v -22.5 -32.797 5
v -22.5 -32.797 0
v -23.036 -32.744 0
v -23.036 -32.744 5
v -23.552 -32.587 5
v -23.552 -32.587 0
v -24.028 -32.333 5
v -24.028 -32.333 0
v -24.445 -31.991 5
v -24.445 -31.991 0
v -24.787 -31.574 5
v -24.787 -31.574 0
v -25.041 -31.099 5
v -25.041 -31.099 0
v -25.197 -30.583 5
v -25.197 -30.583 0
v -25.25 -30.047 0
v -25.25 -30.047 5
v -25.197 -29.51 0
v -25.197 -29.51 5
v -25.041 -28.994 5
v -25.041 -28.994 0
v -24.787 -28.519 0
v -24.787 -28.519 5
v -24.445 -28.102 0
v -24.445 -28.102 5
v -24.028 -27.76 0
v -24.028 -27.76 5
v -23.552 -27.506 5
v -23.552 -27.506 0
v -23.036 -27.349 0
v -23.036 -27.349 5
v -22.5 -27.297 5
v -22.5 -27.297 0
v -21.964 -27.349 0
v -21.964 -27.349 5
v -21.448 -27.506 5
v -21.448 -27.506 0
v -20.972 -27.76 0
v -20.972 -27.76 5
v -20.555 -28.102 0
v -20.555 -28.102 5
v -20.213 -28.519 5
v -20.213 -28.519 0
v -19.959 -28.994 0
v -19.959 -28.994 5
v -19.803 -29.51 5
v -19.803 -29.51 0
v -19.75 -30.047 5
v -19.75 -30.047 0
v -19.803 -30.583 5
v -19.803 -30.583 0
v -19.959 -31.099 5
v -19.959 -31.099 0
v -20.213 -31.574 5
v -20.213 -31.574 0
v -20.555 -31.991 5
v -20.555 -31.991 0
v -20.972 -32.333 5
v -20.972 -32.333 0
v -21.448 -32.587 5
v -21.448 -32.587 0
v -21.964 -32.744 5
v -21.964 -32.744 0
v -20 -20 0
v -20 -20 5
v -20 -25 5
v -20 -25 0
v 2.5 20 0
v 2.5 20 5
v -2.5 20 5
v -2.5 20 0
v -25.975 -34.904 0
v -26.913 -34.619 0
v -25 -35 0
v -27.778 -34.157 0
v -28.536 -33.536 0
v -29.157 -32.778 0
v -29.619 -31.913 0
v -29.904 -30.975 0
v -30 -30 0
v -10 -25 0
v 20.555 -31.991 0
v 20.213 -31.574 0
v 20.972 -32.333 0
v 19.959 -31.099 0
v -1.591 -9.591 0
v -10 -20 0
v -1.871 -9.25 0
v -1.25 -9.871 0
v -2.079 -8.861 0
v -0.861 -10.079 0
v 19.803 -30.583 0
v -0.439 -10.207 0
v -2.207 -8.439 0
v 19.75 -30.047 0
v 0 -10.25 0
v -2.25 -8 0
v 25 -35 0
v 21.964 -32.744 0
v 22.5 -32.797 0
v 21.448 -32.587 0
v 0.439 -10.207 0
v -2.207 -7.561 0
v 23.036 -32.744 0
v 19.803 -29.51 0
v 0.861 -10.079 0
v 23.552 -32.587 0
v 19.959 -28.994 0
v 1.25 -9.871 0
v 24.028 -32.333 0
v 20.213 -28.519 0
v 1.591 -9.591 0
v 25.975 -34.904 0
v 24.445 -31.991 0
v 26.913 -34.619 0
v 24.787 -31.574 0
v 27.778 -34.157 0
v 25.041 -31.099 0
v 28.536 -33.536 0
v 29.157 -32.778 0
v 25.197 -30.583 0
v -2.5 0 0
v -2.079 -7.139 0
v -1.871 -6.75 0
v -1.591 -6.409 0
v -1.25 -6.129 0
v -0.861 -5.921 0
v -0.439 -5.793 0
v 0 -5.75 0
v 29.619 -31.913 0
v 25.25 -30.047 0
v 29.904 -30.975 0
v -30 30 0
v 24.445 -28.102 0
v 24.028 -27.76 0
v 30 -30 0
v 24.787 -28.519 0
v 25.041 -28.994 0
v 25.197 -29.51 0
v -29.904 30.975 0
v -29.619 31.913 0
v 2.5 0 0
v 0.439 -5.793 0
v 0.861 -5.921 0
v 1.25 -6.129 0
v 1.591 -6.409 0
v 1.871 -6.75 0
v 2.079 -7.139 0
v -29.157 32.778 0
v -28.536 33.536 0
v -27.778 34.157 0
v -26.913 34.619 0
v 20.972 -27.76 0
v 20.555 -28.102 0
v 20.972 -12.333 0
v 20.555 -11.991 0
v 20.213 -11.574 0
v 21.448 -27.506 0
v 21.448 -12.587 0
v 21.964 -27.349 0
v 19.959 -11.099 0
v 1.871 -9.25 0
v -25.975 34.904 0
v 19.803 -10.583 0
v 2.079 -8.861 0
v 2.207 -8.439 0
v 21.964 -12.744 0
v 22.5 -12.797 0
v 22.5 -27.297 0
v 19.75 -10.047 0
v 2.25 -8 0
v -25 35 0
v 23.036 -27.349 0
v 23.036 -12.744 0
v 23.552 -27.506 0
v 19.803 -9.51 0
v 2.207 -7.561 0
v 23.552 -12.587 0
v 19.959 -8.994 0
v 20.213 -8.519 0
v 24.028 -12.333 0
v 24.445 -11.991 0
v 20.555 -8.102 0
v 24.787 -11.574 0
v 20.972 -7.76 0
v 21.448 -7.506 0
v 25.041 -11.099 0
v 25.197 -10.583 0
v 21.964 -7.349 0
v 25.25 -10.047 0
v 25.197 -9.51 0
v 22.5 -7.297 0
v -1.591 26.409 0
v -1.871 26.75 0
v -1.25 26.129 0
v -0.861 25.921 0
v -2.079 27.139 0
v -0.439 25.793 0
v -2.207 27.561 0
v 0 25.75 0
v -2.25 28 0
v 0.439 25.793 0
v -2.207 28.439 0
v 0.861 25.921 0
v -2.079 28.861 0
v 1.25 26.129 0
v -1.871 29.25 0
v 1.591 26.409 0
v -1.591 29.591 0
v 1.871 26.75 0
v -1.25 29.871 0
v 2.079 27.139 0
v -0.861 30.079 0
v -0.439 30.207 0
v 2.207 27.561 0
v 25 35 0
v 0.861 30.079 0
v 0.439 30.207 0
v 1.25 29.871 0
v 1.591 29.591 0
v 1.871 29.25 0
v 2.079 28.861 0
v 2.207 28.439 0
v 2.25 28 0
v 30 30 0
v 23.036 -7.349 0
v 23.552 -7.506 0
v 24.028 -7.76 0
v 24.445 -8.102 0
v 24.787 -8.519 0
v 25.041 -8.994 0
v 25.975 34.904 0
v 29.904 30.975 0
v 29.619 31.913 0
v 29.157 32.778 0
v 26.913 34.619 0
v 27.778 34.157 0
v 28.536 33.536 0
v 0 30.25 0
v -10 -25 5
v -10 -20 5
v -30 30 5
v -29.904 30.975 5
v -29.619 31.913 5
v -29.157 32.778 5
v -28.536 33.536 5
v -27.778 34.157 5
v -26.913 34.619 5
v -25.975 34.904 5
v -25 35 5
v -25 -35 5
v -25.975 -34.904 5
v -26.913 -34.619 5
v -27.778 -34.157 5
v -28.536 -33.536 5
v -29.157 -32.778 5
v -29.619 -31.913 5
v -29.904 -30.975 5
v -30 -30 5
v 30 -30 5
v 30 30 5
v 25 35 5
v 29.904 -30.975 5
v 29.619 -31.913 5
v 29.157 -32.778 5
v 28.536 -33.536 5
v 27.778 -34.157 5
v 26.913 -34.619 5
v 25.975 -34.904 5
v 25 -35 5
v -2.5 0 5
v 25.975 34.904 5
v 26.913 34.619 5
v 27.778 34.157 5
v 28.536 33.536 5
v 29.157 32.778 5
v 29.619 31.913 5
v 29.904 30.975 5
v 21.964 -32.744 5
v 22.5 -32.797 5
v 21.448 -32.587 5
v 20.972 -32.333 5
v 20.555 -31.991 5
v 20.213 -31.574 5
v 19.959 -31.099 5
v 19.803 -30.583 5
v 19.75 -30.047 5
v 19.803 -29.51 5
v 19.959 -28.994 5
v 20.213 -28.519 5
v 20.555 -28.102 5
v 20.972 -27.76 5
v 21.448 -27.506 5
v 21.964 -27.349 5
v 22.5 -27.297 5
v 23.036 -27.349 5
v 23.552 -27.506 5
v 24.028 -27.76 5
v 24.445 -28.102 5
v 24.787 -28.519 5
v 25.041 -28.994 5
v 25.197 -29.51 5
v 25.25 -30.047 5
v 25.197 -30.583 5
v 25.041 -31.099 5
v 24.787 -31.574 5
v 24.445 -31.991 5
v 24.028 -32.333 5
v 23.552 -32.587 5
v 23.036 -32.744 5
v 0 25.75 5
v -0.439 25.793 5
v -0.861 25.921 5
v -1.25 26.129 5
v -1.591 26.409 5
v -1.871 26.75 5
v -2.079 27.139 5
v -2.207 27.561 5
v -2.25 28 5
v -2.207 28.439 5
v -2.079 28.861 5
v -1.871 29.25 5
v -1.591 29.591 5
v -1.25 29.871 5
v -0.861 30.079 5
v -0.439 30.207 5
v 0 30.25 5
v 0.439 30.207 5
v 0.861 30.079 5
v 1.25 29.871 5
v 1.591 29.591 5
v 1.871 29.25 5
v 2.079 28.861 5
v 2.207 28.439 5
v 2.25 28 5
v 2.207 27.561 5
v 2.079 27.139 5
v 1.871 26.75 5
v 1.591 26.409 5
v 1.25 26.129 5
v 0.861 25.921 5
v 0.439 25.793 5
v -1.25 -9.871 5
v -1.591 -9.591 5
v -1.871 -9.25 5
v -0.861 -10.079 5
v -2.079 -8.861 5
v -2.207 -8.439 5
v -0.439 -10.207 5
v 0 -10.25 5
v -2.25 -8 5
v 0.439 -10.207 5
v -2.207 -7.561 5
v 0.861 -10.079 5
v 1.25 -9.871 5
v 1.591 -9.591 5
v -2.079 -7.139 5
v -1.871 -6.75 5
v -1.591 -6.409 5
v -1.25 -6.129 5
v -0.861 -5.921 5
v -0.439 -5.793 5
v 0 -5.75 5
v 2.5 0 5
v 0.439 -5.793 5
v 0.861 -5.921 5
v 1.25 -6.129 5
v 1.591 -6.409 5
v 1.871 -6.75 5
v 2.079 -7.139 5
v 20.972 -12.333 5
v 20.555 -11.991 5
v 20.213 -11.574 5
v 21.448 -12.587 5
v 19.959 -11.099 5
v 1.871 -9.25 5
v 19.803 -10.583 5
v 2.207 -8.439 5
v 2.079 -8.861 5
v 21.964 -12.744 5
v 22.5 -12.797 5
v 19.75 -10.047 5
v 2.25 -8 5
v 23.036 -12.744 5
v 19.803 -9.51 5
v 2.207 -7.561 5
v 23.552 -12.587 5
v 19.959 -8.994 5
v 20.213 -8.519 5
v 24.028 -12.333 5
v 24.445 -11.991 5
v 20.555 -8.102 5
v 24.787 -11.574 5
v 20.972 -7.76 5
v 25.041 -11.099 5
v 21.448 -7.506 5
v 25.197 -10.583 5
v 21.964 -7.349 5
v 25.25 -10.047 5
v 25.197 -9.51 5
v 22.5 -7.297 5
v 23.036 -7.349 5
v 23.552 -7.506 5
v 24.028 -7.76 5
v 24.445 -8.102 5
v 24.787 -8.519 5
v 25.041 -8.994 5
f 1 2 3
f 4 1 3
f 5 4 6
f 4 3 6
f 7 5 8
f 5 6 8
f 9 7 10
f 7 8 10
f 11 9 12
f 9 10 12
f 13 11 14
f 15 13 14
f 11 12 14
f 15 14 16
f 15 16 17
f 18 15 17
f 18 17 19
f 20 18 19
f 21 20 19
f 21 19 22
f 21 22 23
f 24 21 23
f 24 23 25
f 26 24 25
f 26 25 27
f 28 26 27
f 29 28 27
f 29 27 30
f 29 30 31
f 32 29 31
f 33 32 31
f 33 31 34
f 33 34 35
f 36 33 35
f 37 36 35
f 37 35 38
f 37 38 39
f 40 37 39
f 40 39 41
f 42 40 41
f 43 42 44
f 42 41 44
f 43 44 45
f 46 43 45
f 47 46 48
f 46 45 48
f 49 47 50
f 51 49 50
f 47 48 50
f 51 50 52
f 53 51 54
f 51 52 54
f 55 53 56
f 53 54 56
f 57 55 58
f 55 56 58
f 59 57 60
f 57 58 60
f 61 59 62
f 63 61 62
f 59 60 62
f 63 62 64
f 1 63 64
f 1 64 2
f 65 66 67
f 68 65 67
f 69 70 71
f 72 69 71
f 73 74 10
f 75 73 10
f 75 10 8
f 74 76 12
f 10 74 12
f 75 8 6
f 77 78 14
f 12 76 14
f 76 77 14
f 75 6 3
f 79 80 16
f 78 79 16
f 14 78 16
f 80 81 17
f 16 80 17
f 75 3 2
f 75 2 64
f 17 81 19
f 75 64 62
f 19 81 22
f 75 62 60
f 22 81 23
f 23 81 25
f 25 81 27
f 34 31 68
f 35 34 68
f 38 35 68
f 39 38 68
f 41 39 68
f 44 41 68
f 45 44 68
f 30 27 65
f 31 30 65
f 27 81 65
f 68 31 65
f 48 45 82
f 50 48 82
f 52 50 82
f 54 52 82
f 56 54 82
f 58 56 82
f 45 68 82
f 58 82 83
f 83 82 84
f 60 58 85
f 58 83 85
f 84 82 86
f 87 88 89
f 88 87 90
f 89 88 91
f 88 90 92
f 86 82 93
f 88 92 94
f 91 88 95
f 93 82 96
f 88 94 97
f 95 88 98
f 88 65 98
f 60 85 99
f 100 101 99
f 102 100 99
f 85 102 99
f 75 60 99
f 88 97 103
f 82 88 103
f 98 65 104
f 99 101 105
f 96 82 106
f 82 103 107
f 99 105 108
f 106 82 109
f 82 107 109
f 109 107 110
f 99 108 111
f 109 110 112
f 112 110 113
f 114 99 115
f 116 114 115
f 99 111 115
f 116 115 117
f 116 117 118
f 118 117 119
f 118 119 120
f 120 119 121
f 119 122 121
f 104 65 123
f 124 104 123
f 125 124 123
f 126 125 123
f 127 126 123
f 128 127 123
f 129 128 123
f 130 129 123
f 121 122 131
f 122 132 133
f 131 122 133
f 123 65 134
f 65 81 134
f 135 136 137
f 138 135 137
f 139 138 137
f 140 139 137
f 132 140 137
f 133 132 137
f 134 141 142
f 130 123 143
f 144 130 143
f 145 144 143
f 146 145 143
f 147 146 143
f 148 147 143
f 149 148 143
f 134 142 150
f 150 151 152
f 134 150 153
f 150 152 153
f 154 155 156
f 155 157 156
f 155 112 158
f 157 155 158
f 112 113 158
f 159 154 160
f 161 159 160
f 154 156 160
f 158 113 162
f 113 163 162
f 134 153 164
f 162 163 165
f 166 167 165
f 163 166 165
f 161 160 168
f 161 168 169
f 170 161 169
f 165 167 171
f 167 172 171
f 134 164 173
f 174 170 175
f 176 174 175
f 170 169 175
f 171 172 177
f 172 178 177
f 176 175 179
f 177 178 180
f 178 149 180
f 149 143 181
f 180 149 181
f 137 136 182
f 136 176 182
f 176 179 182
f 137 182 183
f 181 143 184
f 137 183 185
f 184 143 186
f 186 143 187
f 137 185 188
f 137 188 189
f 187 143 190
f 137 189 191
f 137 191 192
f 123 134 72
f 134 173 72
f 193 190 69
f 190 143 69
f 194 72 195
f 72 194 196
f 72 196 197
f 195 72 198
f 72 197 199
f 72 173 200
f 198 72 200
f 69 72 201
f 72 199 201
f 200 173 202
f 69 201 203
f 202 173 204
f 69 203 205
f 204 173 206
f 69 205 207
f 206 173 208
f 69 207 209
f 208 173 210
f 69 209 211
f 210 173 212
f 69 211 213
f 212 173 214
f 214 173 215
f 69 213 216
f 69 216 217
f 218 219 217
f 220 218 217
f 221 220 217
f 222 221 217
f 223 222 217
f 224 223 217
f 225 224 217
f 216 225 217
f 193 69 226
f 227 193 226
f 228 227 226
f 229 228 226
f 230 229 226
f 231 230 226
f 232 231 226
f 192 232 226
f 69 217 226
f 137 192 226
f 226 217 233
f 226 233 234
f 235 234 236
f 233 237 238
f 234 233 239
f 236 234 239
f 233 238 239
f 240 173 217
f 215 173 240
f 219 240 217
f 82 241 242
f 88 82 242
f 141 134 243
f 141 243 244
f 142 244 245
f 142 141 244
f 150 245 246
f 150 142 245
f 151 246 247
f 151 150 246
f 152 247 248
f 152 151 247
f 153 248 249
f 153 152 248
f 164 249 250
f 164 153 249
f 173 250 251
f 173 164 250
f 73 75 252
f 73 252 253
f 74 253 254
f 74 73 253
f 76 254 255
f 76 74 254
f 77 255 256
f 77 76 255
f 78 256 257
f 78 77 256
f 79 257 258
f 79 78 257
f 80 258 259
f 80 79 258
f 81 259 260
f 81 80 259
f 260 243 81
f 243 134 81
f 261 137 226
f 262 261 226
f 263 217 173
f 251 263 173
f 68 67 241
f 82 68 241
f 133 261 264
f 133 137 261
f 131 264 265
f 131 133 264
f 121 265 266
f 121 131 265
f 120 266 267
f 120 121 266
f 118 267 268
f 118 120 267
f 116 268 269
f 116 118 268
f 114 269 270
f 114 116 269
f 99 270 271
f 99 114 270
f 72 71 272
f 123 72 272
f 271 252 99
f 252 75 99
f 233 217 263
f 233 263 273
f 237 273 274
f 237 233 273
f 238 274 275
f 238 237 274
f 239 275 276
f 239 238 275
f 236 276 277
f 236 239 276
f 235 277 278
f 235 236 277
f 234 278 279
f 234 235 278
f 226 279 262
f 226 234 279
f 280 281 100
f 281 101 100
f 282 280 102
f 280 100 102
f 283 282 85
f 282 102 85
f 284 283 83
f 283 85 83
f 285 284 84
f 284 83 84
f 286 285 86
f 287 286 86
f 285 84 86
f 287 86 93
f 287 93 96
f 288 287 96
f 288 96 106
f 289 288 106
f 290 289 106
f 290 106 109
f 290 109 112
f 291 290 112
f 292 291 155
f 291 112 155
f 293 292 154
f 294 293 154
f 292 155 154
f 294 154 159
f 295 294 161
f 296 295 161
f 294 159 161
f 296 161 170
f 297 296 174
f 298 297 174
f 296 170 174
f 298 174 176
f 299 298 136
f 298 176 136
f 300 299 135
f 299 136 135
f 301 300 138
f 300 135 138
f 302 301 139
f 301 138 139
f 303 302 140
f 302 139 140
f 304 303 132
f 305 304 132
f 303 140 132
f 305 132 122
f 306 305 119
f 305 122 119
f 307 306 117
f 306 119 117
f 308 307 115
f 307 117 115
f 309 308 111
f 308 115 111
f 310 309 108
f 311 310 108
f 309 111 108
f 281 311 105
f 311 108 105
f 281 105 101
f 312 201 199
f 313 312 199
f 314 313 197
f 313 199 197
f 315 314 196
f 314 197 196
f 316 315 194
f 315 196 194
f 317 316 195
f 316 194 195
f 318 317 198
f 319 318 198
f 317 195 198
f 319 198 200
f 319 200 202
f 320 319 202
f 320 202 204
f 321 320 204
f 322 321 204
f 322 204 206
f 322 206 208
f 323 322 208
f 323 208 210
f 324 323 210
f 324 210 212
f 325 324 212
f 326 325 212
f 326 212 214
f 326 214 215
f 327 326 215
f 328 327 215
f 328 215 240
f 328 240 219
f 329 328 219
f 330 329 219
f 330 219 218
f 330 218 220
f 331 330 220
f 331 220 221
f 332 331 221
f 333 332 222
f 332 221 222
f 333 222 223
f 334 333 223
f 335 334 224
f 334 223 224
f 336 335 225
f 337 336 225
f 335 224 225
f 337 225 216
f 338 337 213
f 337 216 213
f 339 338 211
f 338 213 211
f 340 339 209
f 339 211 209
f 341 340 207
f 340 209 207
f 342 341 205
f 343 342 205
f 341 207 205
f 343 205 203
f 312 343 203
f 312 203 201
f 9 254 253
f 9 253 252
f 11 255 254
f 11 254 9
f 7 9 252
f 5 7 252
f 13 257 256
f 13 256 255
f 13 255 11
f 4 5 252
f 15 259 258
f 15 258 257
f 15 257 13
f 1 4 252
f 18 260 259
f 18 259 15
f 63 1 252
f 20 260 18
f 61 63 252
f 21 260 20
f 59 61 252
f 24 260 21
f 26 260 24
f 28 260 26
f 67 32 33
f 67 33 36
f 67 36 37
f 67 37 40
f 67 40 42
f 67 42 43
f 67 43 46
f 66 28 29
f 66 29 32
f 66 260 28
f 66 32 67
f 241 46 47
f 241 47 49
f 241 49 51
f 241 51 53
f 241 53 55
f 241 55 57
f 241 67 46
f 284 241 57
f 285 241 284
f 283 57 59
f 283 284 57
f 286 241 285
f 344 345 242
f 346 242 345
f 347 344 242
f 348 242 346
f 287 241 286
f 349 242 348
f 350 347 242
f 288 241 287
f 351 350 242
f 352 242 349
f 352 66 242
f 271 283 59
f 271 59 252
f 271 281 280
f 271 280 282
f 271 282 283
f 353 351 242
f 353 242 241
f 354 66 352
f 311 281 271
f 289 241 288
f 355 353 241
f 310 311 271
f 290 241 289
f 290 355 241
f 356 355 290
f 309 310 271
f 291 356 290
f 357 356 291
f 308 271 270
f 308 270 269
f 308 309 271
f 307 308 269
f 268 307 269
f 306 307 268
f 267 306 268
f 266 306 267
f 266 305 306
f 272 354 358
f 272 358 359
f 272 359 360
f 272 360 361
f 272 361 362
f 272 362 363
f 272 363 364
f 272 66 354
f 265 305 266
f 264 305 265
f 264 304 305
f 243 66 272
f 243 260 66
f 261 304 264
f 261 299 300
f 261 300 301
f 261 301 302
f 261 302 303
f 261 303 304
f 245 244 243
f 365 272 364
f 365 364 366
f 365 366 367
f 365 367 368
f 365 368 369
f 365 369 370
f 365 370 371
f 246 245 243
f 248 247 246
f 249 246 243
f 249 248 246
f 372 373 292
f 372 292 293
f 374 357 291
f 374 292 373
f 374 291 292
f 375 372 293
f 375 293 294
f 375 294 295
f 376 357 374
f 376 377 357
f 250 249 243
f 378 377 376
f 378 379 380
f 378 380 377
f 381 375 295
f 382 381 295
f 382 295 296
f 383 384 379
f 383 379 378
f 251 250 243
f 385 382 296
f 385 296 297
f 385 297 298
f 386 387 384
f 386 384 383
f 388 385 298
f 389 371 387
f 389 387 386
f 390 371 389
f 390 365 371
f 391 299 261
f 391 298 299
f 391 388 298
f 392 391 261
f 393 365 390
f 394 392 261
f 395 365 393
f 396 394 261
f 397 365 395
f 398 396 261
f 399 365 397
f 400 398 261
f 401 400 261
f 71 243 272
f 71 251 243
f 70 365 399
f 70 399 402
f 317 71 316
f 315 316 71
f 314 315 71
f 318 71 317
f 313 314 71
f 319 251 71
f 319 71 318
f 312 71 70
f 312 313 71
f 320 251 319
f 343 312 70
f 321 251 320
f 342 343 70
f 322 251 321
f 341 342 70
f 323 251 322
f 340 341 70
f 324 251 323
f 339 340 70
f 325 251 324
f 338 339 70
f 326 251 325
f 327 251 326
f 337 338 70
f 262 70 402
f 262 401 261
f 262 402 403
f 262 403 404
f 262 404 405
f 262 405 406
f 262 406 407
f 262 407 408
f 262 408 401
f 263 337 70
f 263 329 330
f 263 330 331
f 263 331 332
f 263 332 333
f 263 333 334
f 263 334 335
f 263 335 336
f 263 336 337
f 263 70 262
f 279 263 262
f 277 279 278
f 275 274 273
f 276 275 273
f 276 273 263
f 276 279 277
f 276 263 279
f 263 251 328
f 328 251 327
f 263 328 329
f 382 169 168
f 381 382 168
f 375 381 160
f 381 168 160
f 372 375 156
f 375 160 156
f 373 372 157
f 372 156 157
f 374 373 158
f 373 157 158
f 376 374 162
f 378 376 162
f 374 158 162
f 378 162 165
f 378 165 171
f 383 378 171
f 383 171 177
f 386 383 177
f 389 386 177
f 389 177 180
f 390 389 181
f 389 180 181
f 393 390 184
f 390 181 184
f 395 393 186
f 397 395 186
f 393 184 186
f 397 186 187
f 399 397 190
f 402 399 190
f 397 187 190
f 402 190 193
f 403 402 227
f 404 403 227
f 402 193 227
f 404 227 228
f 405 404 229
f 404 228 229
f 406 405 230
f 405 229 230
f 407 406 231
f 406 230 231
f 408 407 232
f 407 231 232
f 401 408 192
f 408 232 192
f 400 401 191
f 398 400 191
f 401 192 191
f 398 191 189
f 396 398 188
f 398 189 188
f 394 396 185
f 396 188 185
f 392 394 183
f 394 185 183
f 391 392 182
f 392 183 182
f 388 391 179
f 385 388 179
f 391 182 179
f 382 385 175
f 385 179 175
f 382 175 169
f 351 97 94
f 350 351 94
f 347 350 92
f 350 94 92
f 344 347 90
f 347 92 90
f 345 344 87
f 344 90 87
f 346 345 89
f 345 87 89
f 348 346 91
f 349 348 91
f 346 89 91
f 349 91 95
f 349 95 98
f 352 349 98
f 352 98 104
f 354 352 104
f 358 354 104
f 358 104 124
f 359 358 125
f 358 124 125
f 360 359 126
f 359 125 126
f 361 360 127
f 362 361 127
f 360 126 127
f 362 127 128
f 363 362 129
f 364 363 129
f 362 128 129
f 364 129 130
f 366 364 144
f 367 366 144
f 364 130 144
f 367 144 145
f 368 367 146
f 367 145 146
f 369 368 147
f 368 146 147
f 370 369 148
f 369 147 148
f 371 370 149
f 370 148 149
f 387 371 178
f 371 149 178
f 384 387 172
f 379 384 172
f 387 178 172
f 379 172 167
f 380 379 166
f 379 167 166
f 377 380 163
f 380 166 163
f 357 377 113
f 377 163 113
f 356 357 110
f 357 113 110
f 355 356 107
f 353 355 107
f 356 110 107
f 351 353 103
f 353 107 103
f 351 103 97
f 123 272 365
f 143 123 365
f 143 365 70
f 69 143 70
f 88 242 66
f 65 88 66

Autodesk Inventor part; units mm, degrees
ref_plane "YZ Plane" through (0, 0, 0) normal (1, 0, 0) x (0, 1, 0)
ref_plane "XZ Plane" through (0, 0, 0) normal (0, 1, 0) x (-1, 0, 0)
ref_plane "XY Plane" through (0, 0, 0) normal (0, 0, 1) x (1, 0, 0)
sketch "Sketch1" plane through (0, 0, 0) normal (0, 0, 1) x (1, 0, 0)
  line L0 (-25, -35) -> (25, -35)
  line L1 (30, -30) -> (30, 30)
  line L2 (25, 35) -> (-25, 35)
  line L3 (-30, 30) -> (-30, -30)
  line L4 (-30, -35) -> (30, 35) construction
  line L5 (30, -35) -> (-30, 35) construction
  arc A0 (-25, 35) -> (-30, 30) centre (-25, 30) ccw
  arc A1 (30, 30) -> (25, 35) centre (25, 30) ccw
  arc A2 (25, -35) -> (30, -30) centre (25, -30) ccw
  arc A3 (-30, -30) -> (-25, -35) centre (-25, -30) ccw
  point P0 (0, 0)
  dimension "d0" = 60
  dimension "d1" = 70
  dimension "d4" = 5
extrude "Extrusion1" add sketch "Sketch1" along normal blind 5
sketch "Sketch2" plane through (0, 0, 5) normal (0, 0, 1) x (1, 0, 0)
  line L0 (-22.5, -30.0466) -> (22.5, -30.0466) construction
  line L1 (22.5, -30.0466) -> (22.5, -10.0466) construction
  line L2 (22.5, -10.0466) -> (-22.5, -10.0466) construction
  line L3 (-22.5, -10.0466) -> (-22.5, -30.0466) construction
  line L4 (-22.5, -30.0466) -> (22.5, -10.0466) construction
  line L5 (22.5, -30.0466) -> (-22.5, -10.0466) construction
  point P0 (0, 0)
  point P1 (0, -20.0466)
  point P2 (0, -20.0466)
  dimension "d5" = 45
  dimension "d6" = 20.0466
  dimension "d7" = 20
hole "Hole1" at (22.5, -10.0466, 5) at (22.5, -30.0466, 5) at (-22.5, -30.0466, 5) direction (0, 0, -1) diameter 5.5 depth 8 tip angle 118 clearance for "Countersunk Flat Head Screw DIN EN ISO 2009" size "M5" standard "DIN"
sketch "Sketch3" plane through (0, 0, 5) normal (0, 0, 1) x (1, 0, 0)
  line L0 (-2.5, 0) -> (2.5, 0)
  line L1 (2.5, 0) -> (2.5, 20)
  line L2 (2.5, 20) -> (-2.5, 20)
  line L3 (-2.5, 20) -> (-2.5, 0)
  line L4 (-2.5, 0) -> (2.5, 20) construction
  line L5 (2.5, 0) -> (-2.5, 20) construction
  point P0 (0, 0)
  point P1 (0, 10)
  point P2 (0, 10)
  point P3 (0, 0)
  point P4 (0, 10)
  dimension "d15" = 5
  dimension "d16" = 20
  dimension "d17" = 10
extrude "Extrusion2" cut sketch "Sketch3" against normal blind 5
sketch "Sketch4" plane through (0, 0, 5) normal (0, 0, 1) x (1, 0, 0)
  line L0 (-2.5, 20) -> (2.5, 20) projected
  line L1 (2.5, 0) -> (-2.5, 0) projected
  point P0 (0, 0)
  point P1 (0, 28)
  point P2 (0, -8)
  point P3 (0, 0)
  dimension "d20" = 8
  dimension "d21" = 8
hole "Hole2" at (0, 28, 5) at (0, -8, 5) direction (0, 0, -1) diameter 4.5 depth 8 tip angle 118 clearance for "Countersunk Flat Head Screw DIN EN ISO 2009" size "M4" standard "DIN"
sketch "Sketch5" plane through (0, 0, 5) normal (0, 0, 1) x (1, 0, 0)
  line L0 (2.5, 0) -> (-2.5, 0) projected
  line L1 (-20, -25) -> (-10, -25)
  line L2 (-10, -25) -> (-10, -20)
  line L3 (-10, -20) -> (-20, -20)
  line L4 (-20, -20) -> (-20, -25)
  line L5 (-20, -25) -> (-10, -20) construction
  line L6 (-10, -25) -> (-20, -20) construction
  line L7 (-25, -35) -> (25, -35) projected
  line L8 (-30, 30) -> (-30, -30) projected
  point P0 (0, 0)
  point P1 (0, 0)
  point P2 (-15, -22.5)
  dimension "d34" = 10
  dimension "d35" = 5
  dimension "d36" = 10
  dimension "d37" = 30
  dimension "d38" = 10
extrude "Extrusion3" cut sketch "Sketch5" against normal blind 5
equation "\"d38\" = -0.5 * d34 + 0.5 * d37"
properties part number "Belt_Holder1" material "Polycarbonate, Clear"
